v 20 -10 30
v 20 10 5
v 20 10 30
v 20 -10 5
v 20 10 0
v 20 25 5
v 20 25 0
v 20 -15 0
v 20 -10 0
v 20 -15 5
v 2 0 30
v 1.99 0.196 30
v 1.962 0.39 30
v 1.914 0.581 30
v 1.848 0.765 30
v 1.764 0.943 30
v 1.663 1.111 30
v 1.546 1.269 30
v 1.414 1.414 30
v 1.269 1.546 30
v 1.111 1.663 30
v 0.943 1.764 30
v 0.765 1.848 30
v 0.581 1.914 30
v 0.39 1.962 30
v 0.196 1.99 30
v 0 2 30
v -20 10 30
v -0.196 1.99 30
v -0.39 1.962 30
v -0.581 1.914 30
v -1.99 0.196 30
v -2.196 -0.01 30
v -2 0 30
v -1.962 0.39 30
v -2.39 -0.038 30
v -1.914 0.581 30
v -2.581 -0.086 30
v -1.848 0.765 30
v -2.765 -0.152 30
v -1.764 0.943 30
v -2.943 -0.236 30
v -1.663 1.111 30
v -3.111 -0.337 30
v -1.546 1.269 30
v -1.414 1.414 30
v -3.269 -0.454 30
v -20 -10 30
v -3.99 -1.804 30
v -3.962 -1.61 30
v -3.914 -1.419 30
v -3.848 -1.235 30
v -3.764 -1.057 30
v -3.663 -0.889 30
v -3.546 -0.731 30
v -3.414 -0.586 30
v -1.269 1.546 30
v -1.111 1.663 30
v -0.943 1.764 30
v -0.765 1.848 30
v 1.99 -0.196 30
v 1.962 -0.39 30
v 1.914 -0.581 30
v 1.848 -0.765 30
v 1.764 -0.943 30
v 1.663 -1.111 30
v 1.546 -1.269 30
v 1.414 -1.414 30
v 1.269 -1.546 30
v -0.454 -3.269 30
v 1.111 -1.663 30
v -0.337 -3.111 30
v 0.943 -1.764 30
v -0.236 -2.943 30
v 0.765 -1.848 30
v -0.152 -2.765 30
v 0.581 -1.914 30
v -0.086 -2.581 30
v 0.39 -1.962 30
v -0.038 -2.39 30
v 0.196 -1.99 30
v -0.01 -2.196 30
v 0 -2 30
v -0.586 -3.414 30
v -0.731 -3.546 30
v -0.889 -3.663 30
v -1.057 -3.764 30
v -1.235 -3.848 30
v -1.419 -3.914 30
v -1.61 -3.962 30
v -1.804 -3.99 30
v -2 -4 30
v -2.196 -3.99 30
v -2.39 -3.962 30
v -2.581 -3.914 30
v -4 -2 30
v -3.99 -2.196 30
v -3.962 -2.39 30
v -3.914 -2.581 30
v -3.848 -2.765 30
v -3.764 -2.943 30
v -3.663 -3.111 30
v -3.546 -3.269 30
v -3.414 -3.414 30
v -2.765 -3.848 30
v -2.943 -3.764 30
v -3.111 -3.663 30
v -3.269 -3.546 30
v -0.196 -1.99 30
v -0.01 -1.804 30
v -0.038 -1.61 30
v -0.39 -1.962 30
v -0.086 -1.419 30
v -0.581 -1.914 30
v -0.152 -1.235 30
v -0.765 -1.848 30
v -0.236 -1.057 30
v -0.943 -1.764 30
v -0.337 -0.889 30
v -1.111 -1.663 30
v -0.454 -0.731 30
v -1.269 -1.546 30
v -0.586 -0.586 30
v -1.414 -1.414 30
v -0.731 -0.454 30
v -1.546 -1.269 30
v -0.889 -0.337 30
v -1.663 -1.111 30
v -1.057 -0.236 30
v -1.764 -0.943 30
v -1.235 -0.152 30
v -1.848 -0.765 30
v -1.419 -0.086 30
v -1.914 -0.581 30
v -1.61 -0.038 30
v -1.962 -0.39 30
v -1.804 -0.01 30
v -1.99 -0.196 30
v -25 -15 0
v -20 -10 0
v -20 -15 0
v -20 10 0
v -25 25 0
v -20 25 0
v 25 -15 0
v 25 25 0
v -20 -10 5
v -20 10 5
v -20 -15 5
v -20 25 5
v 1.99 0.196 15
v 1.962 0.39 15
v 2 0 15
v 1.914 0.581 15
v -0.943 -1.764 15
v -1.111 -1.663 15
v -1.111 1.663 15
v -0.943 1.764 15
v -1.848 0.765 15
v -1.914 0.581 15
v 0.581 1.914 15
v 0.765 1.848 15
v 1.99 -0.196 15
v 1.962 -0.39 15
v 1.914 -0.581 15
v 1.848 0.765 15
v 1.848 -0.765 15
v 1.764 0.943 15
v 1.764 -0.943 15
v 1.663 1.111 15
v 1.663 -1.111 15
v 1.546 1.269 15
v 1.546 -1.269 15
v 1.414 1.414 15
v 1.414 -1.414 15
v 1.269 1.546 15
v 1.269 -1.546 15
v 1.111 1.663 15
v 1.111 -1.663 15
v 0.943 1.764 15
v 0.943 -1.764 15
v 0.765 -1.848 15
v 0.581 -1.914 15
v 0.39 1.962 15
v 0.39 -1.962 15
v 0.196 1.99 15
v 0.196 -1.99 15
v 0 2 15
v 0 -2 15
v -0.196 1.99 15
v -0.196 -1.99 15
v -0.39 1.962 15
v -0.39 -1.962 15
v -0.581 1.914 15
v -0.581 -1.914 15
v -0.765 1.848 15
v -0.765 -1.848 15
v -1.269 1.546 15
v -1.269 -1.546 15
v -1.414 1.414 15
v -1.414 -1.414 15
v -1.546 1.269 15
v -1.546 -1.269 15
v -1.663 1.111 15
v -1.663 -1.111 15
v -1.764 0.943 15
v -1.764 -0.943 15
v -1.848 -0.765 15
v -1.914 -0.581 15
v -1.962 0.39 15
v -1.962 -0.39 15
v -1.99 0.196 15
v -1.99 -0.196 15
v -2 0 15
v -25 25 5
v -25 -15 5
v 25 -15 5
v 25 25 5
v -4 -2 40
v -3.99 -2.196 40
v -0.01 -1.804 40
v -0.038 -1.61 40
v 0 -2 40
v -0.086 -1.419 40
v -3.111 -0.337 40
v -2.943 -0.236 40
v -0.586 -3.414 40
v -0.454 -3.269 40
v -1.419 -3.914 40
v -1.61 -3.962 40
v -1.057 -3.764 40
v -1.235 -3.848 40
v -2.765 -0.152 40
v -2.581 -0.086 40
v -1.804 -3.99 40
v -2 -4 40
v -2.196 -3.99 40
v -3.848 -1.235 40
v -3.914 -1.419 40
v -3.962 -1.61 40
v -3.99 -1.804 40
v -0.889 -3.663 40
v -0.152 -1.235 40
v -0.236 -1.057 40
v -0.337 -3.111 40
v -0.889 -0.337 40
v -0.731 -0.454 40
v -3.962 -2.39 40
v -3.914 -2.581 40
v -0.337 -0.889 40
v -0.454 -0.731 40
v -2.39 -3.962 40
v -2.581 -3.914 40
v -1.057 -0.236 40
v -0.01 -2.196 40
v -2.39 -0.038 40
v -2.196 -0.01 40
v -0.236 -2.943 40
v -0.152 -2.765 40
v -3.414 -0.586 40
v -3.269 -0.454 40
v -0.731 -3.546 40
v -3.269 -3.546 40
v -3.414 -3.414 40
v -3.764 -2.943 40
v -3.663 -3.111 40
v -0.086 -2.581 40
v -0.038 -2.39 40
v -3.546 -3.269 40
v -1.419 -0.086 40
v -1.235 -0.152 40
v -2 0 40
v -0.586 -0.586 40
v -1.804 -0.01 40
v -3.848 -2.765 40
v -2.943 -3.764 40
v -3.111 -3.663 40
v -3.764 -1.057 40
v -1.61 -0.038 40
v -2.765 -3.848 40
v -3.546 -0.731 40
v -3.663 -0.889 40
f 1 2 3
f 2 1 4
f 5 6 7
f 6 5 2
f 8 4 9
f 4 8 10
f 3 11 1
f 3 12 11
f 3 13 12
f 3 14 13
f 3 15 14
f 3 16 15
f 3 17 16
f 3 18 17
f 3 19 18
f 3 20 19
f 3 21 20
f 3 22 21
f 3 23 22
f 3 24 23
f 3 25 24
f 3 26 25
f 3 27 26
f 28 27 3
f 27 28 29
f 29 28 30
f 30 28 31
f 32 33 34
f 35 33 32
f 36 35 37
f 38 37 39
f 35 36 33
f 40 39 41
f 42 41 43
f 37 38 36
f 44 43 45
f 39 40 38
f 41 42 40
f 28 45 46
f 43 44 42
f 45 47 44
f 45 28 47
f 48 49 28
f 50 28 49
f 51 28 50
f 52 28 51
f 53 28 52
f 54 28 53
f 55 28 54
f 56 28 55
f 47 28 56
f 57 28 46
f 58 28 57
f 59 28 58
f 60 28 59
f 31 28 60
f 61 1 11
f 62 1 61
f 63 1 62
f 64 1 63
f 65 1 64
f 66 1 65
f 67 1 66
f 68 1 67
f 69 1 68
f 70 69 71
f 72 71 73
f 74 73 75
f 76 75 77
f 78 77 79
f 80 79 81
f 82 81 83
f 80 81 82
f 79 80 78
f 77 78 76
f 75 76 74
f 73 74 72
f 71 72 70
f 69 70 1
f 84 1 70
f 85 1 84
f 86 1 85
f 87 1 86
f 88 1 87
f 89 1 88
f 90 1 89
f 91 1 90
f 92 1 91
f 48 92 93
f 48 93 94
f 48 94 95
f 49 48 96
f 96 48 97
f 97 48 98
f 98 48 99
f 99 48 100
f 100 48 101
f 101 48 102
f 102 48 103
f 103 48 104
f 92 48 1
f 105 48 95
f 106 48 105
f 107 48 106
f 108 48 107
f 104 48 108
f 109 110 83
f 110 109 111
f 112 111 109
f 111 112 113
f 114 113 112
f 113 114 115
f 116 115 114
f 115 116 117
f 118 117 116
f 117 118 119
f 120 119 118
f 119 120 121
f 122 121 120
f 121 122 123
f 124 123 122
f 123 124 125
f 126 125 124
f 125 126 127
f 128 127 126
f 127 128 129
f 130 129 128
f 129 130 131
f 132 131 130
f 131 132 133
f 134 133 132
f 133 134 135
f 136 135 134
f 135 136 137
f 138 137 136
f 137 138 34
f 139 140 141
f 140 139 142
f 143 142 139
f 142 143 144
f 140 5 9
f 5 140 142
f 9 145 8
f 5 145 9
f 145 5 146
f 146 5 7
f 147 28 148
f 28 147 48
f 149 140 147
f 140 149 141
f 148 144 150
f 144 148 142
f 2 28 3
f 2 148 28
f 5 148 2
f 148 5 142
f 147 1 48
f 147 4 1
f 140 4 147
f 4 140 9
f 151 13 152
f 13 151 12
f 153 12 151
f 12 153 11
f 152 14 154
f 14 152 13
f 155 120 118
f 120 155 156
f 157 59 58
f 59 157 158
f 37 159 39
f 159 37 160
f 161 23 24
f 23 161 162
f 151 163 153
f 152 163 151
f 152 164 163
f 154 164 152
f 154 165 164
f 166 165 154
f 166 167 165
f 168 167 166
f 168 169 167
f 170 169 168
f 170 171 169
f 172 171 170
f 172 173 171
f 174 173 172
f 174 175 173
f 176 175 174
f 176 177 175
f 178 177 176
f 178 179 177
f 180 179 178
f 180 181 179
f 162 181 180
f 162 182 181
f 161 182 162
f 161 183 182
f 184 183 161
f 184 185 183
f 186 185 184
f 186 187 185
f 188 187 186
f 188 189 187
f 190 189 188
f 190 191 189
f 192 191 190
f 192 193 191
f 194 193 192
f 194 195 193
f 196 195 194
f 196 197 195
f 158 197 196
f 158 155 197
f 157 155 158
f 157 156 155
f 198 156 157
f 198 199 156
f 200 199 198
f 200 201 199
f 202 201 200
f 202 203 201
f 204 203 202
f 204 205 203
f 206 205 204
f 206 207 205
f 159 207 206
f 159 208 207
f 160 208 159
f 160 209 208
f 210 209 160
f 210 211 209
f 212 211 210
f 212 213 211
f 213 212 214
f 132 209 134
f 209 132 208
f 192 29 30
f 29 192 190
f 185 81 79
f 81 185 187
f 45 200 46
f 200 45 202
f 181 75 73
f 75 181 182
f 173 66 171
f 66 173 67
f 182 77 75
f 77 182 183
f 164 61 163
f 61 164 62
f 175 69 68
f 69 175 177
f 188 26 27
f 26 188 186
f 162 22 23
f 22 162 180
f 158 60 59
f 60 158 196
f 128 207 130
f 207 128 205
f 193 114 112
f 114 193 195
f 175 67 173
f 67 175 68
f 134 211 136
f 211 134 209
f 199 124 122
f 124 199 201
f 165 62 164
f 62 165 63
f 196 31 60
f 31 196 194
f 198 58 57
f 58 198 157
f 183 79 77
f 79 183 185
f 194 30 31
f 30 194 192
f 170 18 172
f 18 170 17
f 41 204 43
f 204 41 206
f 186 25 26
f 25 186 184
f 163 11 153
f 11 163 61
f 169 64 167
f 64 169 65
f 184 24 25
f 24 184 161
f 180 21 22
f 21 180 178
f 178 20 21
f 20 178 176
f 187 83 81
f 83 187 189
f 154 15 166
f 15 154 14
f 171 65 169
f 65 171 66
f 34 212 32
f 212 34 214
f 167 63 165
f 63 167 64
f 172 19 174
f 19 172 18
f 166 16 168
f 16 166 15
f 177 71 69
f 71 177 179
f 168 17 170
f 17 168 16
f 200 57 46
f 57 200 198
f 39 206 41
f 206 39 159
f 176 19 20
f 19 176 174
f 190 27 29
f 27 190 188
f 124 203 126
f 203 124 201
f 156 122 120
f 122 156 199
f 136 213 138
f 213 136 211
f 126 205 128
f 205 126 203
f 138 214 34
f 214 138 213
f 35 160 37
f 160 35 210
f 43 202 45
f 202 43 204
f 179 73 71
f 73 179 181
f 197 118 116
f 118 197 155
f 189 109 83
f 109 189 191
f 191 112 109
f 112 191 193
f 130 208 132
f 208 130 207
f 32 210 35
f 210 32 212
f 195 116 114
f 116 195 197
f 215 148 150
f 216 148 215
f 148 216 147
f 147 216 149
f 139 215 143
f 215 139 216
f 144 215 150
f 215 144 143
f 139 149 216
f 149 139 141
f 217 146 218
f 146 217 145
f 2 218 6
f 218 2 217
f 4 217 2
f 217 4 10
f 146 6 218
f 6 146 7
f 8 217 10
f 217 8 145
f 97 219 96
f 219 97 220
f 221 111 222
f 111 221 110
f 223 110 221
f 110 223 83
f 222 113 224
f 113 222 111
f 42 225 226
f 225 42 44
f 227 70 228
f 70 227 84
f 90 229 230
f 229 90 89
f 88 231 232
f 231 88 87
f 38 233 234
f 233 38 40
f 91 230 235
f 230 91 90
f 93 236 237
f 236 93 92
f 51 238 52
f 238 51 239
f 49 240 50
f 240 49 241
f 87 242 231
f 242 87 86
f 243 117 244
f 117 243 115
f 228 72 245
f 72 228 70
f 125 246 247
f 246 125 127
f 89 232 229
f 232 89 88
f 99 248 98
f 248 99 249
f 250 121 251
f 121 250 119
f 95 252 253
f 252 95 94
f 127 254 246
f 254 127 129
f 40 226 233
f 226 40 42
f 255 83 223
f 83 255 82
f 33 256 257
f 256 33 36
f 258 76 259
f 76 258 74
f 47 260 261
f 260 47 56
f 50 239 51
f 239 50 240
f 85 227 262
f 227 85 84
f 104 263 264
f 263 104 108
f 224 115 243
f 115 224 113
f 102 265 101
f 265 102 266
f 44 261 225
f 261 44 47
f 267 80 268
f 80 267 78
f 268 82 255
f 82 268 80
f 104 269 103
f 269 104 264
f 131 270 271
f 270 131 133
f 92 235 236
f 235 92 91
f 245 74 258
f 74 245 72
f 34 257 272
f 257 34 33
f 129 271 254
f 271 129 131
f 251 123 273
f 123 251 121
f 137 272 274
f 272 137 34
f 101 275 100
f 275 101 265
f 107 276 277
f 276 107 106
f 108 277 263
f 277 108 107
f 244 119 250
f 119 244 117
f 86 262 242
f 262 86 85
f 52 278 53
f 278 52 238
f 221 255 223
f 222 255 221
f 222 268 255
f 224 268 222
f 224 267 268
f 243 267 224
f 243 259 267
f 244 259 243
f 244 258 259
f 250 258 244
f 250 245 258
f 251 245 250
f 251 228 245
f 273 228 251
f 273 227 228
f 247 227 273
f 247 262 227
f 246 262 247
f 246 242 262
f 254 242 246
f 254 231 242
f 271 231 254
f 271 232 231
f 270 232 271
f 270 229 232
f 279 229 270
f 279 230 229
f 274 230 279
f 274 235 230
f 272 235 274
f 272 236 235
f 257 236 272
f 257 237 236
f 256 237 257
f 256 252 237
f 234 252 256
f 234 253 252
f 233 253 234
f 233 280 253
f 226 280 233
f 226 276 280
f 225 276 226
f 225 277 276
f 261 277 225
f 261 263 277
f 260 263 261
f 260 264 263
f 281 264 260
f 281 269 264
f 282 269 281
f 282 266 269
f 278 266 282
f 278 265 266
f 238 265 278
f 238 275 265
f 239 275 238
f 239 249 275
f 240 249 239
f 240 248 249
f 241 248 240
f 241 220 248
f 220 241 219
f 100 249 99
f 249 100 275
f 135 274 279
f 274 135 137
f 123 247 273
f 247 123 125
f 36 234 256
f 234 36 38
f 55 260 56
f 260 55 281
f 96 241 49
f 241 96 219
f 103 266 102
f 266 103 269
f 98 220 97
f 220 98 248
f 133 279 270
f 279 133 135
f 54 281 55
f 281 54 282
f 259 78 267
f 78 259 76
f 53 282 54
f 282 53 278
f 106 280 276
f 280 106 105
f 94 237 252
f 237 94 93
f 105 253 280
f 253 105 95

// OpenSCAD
module servo_motor() {
    difference() {
        // Main body of the servo motor
        translate([-20, -10, 0])
        cube([40, 20, 30]);

        // Shaft hole
        translate([0, 0, 15])
        cylinder(h=15, r=2, $fn=64);
    }
    
    // Mounting flanges
    translate([-25, -15, 0])
    cube([5, 40, 5]);
    
    translate([20, -15, 0])
    cube([5, 40, 5]);
    
    // Shaft
    translate([-2, -2, 30])
    cylinder(h=10, r=2, $fn=64);
}

servo_motor();
